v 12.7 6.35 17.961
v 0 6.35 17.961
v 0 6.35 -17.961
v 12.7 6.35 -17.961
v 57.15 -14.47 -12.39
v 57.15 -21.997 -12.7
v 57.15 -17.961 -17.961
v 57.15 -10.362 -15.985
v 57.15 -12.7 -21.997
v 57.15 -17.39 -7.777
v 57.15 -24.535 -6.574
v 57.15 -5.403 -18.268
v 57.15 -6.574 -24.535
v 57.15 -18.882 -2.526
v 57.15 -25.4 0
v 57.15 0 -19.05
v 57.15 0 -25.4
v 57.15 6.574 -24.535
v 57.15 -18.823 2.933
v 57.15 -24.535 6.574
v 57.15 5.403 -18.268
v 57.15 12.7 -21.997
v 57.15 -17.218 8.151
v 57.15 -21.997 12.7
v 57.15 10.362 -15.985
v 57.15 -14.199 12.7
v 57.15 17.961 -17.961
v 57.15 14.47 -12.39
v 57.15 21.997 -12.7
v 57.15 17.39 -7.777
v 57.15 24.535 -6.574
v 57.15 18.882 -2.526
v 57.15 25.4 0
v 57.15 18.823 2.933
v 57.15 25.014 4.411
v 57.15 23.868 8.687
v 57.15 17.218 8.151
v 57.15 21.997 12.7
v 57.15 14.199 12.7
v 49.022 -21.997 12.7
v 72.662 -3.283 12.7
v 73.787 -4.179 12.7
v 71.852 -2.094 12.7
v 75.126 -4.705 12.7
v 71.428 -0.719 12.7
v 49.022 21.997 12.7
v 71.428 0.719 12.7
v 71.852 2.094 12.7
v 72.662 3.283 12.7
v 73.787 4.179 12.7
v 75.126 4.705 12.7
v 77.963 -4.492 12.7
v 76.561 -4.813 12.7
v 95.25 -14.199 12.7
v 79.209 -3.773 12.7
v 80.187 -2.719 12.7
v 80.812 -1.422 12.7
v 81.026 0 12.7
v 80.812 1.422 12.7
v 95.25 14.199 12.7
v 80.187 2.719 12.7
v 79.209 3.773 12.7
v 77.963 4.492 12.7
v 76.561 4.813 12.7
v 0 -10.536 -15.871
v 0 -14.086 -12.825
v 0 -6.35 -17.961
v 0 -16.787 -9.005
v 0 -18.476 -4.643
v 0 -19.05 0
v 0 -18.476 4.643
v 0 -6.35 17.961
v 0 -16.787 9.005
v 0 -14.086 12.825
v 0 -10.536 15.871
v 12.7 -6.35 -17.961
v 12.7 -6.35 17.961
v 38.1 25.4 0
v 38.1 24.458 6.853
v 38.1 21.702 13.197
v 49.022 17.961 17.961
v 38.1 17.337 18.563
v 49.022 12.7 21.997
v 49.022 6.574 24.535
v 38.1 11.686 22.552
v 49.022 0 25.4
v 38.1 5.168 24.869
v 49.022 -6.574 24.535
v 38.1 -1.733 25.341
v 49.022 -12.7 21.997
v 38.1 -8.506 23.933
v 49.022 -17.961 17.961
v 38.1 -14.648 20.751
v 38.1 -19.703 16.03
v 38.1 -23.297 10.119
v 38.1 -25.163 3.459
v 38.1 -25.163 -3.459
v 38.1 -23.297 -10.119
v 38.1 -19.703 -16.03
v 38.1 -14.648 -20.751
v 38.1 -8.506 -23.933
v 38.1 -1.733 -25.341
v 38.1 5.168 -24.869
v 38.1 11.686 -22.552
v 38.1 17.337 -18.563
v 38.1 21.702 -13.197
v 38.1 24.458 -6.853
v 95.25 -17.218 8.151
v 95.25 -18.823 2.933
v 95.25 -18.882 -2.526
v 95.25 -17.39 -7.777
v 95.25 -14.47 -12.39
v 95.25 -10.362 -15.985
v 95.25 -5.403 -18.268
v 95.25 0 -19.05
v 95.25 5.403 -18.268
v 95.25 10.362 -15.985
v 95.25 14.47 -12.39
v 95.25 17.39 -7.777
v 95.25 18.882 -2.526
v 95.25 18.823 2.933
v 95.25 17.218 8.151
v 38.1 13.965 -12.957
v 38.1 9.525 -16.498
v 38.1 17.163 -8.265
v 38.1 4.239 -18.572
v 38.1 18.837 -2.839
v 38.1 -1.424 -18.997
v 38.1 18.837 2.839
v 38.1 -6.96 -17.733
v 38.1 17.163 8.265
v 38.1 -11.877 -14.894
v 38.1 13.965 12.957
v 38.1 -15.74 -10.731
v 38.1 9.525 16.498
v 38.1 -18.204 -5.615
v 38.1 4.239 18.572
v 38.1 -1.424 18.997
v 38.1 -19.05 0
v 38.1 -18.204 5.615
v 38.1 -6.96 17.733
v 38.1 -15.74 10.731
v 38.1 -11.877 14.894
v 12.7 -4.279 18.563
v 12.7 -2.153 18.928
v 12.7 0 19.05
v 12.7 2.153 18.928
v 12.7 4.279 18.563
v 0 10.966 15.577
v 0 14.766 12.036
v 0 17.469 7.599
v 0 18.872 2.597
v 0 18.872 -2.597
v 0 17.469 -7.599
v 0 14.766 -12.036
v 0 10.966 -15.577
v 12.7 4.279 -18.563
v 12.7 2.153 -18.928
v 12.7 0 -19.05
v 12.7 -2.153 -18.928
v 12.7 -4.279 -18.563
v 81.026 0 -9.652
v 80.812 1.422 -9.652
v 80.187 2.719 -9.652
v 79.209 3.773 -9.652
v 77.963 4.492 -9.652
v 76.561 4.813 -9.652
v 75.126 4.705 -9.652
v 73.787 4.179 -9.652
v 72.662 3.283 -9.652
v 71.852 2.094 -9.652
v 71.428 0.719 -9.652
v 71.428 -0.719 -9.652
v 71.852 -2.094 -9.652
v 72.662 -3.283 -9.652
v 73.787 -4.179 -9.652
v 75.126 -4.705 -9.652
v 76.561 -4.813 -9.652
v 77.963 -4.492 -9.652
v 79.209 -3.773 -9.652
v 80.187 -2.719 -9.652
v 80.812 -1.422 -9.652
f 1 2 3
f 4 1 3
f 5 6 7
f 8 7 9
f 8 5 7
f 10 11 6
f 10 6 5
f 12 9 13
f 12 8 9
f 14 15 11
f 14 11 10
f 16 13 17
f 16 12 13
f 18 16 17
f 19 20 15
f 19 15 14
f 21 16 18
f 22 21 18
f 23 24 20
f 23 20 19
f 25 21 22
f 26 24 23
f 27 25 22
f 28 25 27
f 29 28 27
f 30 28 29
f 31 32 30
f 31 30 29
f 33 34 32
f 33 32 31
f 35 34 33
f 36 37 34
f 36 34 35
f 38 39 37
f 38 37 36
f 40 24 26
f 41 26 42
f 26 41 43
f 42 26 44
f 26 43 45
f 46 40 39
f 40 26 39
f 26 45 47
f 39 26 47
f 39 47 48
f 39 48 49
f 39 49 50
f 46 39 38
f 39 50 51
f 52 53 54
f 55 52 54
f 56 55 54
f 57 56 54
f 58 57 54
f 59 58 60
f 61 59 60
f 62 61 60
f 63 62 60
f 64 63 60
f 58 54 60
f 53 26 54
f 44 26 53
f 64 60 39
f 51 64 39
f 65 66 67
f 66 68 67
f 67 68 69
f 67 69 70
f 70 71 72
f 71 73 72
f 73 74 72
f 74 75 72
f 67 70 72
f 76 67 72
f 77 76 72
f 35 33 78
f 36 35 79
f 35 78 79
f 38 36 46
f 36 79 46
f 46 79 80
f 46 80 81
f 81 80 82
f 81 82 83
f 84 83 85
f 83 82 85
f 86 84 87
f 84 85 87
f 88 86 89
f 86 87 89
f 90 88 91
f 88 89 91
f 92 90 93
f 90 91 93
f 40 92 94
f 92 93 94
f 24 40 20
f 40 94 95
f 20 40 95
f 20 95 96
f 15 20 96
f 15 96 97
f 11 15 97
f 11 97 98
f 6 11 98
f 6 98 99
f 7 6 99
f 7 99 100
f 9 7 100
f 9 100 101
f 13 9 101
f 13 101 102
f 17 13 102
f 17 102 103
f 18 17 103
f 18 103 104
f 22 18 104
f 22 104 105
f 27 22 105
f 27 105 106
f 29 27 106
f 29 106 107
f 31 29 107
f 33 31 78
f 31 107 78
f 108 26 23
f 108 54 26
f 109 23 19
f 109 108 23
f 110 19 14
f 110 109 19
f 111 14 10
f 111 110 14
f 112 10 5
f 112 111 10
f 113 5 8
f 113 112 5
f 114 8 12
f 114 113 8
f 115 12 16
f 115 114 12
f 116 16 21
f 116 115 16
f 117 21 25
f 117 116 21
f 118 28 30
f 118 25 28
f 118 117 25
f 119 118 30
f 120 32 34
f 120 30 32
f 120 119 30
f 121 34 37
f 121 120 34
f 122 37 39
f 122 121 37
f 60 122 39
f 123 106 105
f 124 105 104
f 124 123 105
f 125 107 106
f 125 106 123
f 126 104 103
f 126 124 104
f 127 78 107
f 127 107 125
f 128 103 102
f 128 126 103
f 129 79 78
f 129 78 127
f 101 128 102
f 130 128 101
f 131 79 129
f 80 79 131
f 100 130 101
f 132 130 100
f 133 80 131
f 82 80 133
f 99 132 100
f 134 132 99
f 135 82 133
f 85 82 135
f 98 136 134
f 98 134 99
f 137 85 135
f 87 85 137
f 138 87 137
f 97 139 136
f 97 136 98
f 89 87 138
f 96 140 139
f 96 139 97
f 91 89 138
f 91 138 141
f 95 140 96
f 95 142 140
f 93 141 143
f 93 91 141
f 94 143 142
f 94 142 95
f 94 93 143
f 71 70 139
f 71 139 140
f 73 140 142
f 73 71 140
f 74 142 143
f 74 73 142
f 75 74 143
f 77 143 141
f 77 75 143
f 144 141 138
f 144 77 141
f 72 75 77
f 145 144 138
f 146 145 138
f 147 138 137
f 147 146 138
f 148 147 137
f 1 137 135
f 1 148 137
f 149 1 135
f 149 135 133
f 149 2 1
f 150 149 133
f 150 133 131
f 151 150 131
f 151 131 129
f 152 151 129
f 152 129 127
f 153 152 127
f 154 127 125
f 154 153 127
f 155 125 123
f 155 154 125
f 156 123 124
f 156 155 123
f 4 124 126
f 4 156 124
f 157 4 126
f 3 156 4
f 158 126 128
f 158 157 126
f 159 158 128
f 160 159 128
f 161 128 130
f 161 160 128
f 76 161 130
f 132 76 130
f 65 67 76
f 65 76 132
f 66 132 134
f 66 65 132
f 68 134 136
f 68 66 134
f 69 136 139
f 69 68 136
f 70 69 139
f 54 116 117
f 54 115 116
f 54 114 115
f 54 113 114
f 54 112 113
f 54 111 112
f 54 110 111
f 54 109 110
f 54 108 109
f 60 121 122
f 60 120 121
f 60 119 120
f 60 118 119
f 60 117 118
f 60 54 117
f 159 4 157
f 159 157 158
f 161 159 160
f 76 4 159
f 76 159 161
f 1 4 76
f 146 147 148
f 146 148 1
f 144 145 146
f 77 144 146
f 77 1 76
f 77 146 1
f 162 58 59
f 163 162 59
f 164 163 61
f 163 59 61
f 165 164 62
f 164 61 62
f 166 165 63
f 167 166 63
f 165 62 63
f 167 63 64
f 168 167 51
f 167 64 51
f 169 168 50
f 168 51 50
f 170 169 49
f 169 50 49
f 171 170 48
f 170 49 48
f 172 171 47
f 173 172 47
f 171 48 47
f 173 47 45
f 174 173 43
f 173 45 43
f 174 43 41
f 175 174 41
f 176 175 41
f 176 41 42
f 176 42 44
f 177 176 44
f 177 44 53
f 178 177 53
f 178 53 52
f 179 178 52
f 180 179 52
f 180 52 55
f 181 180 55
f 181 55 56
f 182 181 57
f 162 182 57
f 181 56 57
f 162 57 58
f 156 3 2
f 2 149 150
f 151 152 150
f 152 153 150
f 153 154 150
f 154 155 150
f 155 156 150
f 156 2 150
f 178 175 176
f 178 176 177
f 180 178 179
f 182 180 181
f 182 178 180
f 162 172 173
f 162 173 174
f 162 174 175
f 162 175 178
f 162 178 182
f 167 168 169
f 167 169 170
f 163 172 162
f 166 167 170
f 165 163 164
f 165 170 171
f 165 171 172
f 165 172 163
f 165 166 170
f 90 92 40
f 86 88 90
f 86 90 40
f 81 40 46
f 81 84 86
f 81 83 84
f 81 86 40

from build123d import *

# Parameters (mm, degrees)
F0_R      = 25.4
F1_DEPTH  = 95.25
F2_R      = 25.4
F2_R_2    = 19.05
F3_DEPTH  = 38.1
F4_R      = 25.4
F4_R_2    = 19.05
F5_DEPTH  = 38.1
F7_DEPTH  = 12.7
F9_DEPTH  = 46.228
F10_R     = 4.826
F11_DEPTH = 22.352


with BuildPart() as f1:
    # F0 (on Right) → F1 (new body)
    with BuildSketch(Plane.YZ):
        Circle(F0_R)
    extrude(amount=F1_DEPTH)

    # F2 (on face) → F3 (cut)
    with BuildSketch(Plane.YZ.offset(95.25)):
        Circle(F2_R)
        Circle(F2_R_2, mode=Mode.SUBTRACT)
    extrude(amount=-F3_DEPTH, mode=Mode.SUBTRACT)

    # F4 (on face) → F5 (cut)
    with BuildSketch(Plane(origin=(0, 0, 0), x_dir=(0, -1, 0), z_dir=(-1, 0, 0))):
        Circle(F4_R)
        Circle(F4_R_2, mode=Mode.SUBTRACT)
    extrude(amount=-F5_DEPTH, mode=Mode.SUBTRACT)

    # F6 (on face) → F7 (cut)
    with BuildSketch(Plane(origin=(0, 0, 0), x_dir=(0, -1, 0), z_dir=(-1, 0, 0))):
        with BuildLine():
            ThreePointArc((6.35, 17.9605122421), (3.2213926947, 18.7756525614), (0, 19.05))
            ThreePointArc((0, 19.05), (-3.2213926947, 18.7756525614), (-6.35, 17.9605122421))
            Line((-6.35, 17.9605122421), (-6.35, -17.9605122421))
            ThreePointArc((-6.35, -17.9605122421), (-3.2213926947, -18.7756525614), (0, -19.05))
            ThreePointArc((0, -19.05), (3.2213926947, -18.7756525614), (6.35, -17.9605122421))
            Line((6.35, -17.9605122421), (6.35, 17.9605122421))
        make_face()
    extrude(amount=-F7_DEPTH, mode=Mode.SUBTRACT)

    # F8 (on face) → F9 (cut)
    with BuildSketch(Plane.YZ.offset(95.25)):
        with BuildLine():
            Line((-40.058898566, 25.4), (-40.058898566, 21.5428465581))
            Line((-40.058898566, 21.5428465581), (-40.058898566, 12.7))
            Line((-40.058898566, 12.7), (-14.1990316571, 12.7))
            ThreePointArc((-14.1990316571, 12.7), (0, 19.05), (14.1990316571, 12.7))
            Line((14.1990316571, 12.7), (36.141101434, 12.7))
            Line((36.141101434, 12.7), (36.141101434, 25.4))
            Line((36.141101434, 25.4), (-40.058898566, 25.4))
        make_face()
        with BuildLine():
            ThreePointArc((14.1990316571, 12.7), (0, 19.05), (-14.1990316571, 12.7))
            Line((-14.1990316571, 12.7), (14.1990316571, 12.7))
        make_face()
    extrude(amount=-F9_DEPTH, mode=Mode.SUBTRACT)

    # F10 (on face) → F11 (cut)
    with BuildSketch(Plane.XY.offset(12.7)):
        with Locations((76.2, 0)):
            Circle(F10_R)
    extrude(amount=-F11_DEPTH, mode=Mode.SUBTRACT)


solid = f1.part
